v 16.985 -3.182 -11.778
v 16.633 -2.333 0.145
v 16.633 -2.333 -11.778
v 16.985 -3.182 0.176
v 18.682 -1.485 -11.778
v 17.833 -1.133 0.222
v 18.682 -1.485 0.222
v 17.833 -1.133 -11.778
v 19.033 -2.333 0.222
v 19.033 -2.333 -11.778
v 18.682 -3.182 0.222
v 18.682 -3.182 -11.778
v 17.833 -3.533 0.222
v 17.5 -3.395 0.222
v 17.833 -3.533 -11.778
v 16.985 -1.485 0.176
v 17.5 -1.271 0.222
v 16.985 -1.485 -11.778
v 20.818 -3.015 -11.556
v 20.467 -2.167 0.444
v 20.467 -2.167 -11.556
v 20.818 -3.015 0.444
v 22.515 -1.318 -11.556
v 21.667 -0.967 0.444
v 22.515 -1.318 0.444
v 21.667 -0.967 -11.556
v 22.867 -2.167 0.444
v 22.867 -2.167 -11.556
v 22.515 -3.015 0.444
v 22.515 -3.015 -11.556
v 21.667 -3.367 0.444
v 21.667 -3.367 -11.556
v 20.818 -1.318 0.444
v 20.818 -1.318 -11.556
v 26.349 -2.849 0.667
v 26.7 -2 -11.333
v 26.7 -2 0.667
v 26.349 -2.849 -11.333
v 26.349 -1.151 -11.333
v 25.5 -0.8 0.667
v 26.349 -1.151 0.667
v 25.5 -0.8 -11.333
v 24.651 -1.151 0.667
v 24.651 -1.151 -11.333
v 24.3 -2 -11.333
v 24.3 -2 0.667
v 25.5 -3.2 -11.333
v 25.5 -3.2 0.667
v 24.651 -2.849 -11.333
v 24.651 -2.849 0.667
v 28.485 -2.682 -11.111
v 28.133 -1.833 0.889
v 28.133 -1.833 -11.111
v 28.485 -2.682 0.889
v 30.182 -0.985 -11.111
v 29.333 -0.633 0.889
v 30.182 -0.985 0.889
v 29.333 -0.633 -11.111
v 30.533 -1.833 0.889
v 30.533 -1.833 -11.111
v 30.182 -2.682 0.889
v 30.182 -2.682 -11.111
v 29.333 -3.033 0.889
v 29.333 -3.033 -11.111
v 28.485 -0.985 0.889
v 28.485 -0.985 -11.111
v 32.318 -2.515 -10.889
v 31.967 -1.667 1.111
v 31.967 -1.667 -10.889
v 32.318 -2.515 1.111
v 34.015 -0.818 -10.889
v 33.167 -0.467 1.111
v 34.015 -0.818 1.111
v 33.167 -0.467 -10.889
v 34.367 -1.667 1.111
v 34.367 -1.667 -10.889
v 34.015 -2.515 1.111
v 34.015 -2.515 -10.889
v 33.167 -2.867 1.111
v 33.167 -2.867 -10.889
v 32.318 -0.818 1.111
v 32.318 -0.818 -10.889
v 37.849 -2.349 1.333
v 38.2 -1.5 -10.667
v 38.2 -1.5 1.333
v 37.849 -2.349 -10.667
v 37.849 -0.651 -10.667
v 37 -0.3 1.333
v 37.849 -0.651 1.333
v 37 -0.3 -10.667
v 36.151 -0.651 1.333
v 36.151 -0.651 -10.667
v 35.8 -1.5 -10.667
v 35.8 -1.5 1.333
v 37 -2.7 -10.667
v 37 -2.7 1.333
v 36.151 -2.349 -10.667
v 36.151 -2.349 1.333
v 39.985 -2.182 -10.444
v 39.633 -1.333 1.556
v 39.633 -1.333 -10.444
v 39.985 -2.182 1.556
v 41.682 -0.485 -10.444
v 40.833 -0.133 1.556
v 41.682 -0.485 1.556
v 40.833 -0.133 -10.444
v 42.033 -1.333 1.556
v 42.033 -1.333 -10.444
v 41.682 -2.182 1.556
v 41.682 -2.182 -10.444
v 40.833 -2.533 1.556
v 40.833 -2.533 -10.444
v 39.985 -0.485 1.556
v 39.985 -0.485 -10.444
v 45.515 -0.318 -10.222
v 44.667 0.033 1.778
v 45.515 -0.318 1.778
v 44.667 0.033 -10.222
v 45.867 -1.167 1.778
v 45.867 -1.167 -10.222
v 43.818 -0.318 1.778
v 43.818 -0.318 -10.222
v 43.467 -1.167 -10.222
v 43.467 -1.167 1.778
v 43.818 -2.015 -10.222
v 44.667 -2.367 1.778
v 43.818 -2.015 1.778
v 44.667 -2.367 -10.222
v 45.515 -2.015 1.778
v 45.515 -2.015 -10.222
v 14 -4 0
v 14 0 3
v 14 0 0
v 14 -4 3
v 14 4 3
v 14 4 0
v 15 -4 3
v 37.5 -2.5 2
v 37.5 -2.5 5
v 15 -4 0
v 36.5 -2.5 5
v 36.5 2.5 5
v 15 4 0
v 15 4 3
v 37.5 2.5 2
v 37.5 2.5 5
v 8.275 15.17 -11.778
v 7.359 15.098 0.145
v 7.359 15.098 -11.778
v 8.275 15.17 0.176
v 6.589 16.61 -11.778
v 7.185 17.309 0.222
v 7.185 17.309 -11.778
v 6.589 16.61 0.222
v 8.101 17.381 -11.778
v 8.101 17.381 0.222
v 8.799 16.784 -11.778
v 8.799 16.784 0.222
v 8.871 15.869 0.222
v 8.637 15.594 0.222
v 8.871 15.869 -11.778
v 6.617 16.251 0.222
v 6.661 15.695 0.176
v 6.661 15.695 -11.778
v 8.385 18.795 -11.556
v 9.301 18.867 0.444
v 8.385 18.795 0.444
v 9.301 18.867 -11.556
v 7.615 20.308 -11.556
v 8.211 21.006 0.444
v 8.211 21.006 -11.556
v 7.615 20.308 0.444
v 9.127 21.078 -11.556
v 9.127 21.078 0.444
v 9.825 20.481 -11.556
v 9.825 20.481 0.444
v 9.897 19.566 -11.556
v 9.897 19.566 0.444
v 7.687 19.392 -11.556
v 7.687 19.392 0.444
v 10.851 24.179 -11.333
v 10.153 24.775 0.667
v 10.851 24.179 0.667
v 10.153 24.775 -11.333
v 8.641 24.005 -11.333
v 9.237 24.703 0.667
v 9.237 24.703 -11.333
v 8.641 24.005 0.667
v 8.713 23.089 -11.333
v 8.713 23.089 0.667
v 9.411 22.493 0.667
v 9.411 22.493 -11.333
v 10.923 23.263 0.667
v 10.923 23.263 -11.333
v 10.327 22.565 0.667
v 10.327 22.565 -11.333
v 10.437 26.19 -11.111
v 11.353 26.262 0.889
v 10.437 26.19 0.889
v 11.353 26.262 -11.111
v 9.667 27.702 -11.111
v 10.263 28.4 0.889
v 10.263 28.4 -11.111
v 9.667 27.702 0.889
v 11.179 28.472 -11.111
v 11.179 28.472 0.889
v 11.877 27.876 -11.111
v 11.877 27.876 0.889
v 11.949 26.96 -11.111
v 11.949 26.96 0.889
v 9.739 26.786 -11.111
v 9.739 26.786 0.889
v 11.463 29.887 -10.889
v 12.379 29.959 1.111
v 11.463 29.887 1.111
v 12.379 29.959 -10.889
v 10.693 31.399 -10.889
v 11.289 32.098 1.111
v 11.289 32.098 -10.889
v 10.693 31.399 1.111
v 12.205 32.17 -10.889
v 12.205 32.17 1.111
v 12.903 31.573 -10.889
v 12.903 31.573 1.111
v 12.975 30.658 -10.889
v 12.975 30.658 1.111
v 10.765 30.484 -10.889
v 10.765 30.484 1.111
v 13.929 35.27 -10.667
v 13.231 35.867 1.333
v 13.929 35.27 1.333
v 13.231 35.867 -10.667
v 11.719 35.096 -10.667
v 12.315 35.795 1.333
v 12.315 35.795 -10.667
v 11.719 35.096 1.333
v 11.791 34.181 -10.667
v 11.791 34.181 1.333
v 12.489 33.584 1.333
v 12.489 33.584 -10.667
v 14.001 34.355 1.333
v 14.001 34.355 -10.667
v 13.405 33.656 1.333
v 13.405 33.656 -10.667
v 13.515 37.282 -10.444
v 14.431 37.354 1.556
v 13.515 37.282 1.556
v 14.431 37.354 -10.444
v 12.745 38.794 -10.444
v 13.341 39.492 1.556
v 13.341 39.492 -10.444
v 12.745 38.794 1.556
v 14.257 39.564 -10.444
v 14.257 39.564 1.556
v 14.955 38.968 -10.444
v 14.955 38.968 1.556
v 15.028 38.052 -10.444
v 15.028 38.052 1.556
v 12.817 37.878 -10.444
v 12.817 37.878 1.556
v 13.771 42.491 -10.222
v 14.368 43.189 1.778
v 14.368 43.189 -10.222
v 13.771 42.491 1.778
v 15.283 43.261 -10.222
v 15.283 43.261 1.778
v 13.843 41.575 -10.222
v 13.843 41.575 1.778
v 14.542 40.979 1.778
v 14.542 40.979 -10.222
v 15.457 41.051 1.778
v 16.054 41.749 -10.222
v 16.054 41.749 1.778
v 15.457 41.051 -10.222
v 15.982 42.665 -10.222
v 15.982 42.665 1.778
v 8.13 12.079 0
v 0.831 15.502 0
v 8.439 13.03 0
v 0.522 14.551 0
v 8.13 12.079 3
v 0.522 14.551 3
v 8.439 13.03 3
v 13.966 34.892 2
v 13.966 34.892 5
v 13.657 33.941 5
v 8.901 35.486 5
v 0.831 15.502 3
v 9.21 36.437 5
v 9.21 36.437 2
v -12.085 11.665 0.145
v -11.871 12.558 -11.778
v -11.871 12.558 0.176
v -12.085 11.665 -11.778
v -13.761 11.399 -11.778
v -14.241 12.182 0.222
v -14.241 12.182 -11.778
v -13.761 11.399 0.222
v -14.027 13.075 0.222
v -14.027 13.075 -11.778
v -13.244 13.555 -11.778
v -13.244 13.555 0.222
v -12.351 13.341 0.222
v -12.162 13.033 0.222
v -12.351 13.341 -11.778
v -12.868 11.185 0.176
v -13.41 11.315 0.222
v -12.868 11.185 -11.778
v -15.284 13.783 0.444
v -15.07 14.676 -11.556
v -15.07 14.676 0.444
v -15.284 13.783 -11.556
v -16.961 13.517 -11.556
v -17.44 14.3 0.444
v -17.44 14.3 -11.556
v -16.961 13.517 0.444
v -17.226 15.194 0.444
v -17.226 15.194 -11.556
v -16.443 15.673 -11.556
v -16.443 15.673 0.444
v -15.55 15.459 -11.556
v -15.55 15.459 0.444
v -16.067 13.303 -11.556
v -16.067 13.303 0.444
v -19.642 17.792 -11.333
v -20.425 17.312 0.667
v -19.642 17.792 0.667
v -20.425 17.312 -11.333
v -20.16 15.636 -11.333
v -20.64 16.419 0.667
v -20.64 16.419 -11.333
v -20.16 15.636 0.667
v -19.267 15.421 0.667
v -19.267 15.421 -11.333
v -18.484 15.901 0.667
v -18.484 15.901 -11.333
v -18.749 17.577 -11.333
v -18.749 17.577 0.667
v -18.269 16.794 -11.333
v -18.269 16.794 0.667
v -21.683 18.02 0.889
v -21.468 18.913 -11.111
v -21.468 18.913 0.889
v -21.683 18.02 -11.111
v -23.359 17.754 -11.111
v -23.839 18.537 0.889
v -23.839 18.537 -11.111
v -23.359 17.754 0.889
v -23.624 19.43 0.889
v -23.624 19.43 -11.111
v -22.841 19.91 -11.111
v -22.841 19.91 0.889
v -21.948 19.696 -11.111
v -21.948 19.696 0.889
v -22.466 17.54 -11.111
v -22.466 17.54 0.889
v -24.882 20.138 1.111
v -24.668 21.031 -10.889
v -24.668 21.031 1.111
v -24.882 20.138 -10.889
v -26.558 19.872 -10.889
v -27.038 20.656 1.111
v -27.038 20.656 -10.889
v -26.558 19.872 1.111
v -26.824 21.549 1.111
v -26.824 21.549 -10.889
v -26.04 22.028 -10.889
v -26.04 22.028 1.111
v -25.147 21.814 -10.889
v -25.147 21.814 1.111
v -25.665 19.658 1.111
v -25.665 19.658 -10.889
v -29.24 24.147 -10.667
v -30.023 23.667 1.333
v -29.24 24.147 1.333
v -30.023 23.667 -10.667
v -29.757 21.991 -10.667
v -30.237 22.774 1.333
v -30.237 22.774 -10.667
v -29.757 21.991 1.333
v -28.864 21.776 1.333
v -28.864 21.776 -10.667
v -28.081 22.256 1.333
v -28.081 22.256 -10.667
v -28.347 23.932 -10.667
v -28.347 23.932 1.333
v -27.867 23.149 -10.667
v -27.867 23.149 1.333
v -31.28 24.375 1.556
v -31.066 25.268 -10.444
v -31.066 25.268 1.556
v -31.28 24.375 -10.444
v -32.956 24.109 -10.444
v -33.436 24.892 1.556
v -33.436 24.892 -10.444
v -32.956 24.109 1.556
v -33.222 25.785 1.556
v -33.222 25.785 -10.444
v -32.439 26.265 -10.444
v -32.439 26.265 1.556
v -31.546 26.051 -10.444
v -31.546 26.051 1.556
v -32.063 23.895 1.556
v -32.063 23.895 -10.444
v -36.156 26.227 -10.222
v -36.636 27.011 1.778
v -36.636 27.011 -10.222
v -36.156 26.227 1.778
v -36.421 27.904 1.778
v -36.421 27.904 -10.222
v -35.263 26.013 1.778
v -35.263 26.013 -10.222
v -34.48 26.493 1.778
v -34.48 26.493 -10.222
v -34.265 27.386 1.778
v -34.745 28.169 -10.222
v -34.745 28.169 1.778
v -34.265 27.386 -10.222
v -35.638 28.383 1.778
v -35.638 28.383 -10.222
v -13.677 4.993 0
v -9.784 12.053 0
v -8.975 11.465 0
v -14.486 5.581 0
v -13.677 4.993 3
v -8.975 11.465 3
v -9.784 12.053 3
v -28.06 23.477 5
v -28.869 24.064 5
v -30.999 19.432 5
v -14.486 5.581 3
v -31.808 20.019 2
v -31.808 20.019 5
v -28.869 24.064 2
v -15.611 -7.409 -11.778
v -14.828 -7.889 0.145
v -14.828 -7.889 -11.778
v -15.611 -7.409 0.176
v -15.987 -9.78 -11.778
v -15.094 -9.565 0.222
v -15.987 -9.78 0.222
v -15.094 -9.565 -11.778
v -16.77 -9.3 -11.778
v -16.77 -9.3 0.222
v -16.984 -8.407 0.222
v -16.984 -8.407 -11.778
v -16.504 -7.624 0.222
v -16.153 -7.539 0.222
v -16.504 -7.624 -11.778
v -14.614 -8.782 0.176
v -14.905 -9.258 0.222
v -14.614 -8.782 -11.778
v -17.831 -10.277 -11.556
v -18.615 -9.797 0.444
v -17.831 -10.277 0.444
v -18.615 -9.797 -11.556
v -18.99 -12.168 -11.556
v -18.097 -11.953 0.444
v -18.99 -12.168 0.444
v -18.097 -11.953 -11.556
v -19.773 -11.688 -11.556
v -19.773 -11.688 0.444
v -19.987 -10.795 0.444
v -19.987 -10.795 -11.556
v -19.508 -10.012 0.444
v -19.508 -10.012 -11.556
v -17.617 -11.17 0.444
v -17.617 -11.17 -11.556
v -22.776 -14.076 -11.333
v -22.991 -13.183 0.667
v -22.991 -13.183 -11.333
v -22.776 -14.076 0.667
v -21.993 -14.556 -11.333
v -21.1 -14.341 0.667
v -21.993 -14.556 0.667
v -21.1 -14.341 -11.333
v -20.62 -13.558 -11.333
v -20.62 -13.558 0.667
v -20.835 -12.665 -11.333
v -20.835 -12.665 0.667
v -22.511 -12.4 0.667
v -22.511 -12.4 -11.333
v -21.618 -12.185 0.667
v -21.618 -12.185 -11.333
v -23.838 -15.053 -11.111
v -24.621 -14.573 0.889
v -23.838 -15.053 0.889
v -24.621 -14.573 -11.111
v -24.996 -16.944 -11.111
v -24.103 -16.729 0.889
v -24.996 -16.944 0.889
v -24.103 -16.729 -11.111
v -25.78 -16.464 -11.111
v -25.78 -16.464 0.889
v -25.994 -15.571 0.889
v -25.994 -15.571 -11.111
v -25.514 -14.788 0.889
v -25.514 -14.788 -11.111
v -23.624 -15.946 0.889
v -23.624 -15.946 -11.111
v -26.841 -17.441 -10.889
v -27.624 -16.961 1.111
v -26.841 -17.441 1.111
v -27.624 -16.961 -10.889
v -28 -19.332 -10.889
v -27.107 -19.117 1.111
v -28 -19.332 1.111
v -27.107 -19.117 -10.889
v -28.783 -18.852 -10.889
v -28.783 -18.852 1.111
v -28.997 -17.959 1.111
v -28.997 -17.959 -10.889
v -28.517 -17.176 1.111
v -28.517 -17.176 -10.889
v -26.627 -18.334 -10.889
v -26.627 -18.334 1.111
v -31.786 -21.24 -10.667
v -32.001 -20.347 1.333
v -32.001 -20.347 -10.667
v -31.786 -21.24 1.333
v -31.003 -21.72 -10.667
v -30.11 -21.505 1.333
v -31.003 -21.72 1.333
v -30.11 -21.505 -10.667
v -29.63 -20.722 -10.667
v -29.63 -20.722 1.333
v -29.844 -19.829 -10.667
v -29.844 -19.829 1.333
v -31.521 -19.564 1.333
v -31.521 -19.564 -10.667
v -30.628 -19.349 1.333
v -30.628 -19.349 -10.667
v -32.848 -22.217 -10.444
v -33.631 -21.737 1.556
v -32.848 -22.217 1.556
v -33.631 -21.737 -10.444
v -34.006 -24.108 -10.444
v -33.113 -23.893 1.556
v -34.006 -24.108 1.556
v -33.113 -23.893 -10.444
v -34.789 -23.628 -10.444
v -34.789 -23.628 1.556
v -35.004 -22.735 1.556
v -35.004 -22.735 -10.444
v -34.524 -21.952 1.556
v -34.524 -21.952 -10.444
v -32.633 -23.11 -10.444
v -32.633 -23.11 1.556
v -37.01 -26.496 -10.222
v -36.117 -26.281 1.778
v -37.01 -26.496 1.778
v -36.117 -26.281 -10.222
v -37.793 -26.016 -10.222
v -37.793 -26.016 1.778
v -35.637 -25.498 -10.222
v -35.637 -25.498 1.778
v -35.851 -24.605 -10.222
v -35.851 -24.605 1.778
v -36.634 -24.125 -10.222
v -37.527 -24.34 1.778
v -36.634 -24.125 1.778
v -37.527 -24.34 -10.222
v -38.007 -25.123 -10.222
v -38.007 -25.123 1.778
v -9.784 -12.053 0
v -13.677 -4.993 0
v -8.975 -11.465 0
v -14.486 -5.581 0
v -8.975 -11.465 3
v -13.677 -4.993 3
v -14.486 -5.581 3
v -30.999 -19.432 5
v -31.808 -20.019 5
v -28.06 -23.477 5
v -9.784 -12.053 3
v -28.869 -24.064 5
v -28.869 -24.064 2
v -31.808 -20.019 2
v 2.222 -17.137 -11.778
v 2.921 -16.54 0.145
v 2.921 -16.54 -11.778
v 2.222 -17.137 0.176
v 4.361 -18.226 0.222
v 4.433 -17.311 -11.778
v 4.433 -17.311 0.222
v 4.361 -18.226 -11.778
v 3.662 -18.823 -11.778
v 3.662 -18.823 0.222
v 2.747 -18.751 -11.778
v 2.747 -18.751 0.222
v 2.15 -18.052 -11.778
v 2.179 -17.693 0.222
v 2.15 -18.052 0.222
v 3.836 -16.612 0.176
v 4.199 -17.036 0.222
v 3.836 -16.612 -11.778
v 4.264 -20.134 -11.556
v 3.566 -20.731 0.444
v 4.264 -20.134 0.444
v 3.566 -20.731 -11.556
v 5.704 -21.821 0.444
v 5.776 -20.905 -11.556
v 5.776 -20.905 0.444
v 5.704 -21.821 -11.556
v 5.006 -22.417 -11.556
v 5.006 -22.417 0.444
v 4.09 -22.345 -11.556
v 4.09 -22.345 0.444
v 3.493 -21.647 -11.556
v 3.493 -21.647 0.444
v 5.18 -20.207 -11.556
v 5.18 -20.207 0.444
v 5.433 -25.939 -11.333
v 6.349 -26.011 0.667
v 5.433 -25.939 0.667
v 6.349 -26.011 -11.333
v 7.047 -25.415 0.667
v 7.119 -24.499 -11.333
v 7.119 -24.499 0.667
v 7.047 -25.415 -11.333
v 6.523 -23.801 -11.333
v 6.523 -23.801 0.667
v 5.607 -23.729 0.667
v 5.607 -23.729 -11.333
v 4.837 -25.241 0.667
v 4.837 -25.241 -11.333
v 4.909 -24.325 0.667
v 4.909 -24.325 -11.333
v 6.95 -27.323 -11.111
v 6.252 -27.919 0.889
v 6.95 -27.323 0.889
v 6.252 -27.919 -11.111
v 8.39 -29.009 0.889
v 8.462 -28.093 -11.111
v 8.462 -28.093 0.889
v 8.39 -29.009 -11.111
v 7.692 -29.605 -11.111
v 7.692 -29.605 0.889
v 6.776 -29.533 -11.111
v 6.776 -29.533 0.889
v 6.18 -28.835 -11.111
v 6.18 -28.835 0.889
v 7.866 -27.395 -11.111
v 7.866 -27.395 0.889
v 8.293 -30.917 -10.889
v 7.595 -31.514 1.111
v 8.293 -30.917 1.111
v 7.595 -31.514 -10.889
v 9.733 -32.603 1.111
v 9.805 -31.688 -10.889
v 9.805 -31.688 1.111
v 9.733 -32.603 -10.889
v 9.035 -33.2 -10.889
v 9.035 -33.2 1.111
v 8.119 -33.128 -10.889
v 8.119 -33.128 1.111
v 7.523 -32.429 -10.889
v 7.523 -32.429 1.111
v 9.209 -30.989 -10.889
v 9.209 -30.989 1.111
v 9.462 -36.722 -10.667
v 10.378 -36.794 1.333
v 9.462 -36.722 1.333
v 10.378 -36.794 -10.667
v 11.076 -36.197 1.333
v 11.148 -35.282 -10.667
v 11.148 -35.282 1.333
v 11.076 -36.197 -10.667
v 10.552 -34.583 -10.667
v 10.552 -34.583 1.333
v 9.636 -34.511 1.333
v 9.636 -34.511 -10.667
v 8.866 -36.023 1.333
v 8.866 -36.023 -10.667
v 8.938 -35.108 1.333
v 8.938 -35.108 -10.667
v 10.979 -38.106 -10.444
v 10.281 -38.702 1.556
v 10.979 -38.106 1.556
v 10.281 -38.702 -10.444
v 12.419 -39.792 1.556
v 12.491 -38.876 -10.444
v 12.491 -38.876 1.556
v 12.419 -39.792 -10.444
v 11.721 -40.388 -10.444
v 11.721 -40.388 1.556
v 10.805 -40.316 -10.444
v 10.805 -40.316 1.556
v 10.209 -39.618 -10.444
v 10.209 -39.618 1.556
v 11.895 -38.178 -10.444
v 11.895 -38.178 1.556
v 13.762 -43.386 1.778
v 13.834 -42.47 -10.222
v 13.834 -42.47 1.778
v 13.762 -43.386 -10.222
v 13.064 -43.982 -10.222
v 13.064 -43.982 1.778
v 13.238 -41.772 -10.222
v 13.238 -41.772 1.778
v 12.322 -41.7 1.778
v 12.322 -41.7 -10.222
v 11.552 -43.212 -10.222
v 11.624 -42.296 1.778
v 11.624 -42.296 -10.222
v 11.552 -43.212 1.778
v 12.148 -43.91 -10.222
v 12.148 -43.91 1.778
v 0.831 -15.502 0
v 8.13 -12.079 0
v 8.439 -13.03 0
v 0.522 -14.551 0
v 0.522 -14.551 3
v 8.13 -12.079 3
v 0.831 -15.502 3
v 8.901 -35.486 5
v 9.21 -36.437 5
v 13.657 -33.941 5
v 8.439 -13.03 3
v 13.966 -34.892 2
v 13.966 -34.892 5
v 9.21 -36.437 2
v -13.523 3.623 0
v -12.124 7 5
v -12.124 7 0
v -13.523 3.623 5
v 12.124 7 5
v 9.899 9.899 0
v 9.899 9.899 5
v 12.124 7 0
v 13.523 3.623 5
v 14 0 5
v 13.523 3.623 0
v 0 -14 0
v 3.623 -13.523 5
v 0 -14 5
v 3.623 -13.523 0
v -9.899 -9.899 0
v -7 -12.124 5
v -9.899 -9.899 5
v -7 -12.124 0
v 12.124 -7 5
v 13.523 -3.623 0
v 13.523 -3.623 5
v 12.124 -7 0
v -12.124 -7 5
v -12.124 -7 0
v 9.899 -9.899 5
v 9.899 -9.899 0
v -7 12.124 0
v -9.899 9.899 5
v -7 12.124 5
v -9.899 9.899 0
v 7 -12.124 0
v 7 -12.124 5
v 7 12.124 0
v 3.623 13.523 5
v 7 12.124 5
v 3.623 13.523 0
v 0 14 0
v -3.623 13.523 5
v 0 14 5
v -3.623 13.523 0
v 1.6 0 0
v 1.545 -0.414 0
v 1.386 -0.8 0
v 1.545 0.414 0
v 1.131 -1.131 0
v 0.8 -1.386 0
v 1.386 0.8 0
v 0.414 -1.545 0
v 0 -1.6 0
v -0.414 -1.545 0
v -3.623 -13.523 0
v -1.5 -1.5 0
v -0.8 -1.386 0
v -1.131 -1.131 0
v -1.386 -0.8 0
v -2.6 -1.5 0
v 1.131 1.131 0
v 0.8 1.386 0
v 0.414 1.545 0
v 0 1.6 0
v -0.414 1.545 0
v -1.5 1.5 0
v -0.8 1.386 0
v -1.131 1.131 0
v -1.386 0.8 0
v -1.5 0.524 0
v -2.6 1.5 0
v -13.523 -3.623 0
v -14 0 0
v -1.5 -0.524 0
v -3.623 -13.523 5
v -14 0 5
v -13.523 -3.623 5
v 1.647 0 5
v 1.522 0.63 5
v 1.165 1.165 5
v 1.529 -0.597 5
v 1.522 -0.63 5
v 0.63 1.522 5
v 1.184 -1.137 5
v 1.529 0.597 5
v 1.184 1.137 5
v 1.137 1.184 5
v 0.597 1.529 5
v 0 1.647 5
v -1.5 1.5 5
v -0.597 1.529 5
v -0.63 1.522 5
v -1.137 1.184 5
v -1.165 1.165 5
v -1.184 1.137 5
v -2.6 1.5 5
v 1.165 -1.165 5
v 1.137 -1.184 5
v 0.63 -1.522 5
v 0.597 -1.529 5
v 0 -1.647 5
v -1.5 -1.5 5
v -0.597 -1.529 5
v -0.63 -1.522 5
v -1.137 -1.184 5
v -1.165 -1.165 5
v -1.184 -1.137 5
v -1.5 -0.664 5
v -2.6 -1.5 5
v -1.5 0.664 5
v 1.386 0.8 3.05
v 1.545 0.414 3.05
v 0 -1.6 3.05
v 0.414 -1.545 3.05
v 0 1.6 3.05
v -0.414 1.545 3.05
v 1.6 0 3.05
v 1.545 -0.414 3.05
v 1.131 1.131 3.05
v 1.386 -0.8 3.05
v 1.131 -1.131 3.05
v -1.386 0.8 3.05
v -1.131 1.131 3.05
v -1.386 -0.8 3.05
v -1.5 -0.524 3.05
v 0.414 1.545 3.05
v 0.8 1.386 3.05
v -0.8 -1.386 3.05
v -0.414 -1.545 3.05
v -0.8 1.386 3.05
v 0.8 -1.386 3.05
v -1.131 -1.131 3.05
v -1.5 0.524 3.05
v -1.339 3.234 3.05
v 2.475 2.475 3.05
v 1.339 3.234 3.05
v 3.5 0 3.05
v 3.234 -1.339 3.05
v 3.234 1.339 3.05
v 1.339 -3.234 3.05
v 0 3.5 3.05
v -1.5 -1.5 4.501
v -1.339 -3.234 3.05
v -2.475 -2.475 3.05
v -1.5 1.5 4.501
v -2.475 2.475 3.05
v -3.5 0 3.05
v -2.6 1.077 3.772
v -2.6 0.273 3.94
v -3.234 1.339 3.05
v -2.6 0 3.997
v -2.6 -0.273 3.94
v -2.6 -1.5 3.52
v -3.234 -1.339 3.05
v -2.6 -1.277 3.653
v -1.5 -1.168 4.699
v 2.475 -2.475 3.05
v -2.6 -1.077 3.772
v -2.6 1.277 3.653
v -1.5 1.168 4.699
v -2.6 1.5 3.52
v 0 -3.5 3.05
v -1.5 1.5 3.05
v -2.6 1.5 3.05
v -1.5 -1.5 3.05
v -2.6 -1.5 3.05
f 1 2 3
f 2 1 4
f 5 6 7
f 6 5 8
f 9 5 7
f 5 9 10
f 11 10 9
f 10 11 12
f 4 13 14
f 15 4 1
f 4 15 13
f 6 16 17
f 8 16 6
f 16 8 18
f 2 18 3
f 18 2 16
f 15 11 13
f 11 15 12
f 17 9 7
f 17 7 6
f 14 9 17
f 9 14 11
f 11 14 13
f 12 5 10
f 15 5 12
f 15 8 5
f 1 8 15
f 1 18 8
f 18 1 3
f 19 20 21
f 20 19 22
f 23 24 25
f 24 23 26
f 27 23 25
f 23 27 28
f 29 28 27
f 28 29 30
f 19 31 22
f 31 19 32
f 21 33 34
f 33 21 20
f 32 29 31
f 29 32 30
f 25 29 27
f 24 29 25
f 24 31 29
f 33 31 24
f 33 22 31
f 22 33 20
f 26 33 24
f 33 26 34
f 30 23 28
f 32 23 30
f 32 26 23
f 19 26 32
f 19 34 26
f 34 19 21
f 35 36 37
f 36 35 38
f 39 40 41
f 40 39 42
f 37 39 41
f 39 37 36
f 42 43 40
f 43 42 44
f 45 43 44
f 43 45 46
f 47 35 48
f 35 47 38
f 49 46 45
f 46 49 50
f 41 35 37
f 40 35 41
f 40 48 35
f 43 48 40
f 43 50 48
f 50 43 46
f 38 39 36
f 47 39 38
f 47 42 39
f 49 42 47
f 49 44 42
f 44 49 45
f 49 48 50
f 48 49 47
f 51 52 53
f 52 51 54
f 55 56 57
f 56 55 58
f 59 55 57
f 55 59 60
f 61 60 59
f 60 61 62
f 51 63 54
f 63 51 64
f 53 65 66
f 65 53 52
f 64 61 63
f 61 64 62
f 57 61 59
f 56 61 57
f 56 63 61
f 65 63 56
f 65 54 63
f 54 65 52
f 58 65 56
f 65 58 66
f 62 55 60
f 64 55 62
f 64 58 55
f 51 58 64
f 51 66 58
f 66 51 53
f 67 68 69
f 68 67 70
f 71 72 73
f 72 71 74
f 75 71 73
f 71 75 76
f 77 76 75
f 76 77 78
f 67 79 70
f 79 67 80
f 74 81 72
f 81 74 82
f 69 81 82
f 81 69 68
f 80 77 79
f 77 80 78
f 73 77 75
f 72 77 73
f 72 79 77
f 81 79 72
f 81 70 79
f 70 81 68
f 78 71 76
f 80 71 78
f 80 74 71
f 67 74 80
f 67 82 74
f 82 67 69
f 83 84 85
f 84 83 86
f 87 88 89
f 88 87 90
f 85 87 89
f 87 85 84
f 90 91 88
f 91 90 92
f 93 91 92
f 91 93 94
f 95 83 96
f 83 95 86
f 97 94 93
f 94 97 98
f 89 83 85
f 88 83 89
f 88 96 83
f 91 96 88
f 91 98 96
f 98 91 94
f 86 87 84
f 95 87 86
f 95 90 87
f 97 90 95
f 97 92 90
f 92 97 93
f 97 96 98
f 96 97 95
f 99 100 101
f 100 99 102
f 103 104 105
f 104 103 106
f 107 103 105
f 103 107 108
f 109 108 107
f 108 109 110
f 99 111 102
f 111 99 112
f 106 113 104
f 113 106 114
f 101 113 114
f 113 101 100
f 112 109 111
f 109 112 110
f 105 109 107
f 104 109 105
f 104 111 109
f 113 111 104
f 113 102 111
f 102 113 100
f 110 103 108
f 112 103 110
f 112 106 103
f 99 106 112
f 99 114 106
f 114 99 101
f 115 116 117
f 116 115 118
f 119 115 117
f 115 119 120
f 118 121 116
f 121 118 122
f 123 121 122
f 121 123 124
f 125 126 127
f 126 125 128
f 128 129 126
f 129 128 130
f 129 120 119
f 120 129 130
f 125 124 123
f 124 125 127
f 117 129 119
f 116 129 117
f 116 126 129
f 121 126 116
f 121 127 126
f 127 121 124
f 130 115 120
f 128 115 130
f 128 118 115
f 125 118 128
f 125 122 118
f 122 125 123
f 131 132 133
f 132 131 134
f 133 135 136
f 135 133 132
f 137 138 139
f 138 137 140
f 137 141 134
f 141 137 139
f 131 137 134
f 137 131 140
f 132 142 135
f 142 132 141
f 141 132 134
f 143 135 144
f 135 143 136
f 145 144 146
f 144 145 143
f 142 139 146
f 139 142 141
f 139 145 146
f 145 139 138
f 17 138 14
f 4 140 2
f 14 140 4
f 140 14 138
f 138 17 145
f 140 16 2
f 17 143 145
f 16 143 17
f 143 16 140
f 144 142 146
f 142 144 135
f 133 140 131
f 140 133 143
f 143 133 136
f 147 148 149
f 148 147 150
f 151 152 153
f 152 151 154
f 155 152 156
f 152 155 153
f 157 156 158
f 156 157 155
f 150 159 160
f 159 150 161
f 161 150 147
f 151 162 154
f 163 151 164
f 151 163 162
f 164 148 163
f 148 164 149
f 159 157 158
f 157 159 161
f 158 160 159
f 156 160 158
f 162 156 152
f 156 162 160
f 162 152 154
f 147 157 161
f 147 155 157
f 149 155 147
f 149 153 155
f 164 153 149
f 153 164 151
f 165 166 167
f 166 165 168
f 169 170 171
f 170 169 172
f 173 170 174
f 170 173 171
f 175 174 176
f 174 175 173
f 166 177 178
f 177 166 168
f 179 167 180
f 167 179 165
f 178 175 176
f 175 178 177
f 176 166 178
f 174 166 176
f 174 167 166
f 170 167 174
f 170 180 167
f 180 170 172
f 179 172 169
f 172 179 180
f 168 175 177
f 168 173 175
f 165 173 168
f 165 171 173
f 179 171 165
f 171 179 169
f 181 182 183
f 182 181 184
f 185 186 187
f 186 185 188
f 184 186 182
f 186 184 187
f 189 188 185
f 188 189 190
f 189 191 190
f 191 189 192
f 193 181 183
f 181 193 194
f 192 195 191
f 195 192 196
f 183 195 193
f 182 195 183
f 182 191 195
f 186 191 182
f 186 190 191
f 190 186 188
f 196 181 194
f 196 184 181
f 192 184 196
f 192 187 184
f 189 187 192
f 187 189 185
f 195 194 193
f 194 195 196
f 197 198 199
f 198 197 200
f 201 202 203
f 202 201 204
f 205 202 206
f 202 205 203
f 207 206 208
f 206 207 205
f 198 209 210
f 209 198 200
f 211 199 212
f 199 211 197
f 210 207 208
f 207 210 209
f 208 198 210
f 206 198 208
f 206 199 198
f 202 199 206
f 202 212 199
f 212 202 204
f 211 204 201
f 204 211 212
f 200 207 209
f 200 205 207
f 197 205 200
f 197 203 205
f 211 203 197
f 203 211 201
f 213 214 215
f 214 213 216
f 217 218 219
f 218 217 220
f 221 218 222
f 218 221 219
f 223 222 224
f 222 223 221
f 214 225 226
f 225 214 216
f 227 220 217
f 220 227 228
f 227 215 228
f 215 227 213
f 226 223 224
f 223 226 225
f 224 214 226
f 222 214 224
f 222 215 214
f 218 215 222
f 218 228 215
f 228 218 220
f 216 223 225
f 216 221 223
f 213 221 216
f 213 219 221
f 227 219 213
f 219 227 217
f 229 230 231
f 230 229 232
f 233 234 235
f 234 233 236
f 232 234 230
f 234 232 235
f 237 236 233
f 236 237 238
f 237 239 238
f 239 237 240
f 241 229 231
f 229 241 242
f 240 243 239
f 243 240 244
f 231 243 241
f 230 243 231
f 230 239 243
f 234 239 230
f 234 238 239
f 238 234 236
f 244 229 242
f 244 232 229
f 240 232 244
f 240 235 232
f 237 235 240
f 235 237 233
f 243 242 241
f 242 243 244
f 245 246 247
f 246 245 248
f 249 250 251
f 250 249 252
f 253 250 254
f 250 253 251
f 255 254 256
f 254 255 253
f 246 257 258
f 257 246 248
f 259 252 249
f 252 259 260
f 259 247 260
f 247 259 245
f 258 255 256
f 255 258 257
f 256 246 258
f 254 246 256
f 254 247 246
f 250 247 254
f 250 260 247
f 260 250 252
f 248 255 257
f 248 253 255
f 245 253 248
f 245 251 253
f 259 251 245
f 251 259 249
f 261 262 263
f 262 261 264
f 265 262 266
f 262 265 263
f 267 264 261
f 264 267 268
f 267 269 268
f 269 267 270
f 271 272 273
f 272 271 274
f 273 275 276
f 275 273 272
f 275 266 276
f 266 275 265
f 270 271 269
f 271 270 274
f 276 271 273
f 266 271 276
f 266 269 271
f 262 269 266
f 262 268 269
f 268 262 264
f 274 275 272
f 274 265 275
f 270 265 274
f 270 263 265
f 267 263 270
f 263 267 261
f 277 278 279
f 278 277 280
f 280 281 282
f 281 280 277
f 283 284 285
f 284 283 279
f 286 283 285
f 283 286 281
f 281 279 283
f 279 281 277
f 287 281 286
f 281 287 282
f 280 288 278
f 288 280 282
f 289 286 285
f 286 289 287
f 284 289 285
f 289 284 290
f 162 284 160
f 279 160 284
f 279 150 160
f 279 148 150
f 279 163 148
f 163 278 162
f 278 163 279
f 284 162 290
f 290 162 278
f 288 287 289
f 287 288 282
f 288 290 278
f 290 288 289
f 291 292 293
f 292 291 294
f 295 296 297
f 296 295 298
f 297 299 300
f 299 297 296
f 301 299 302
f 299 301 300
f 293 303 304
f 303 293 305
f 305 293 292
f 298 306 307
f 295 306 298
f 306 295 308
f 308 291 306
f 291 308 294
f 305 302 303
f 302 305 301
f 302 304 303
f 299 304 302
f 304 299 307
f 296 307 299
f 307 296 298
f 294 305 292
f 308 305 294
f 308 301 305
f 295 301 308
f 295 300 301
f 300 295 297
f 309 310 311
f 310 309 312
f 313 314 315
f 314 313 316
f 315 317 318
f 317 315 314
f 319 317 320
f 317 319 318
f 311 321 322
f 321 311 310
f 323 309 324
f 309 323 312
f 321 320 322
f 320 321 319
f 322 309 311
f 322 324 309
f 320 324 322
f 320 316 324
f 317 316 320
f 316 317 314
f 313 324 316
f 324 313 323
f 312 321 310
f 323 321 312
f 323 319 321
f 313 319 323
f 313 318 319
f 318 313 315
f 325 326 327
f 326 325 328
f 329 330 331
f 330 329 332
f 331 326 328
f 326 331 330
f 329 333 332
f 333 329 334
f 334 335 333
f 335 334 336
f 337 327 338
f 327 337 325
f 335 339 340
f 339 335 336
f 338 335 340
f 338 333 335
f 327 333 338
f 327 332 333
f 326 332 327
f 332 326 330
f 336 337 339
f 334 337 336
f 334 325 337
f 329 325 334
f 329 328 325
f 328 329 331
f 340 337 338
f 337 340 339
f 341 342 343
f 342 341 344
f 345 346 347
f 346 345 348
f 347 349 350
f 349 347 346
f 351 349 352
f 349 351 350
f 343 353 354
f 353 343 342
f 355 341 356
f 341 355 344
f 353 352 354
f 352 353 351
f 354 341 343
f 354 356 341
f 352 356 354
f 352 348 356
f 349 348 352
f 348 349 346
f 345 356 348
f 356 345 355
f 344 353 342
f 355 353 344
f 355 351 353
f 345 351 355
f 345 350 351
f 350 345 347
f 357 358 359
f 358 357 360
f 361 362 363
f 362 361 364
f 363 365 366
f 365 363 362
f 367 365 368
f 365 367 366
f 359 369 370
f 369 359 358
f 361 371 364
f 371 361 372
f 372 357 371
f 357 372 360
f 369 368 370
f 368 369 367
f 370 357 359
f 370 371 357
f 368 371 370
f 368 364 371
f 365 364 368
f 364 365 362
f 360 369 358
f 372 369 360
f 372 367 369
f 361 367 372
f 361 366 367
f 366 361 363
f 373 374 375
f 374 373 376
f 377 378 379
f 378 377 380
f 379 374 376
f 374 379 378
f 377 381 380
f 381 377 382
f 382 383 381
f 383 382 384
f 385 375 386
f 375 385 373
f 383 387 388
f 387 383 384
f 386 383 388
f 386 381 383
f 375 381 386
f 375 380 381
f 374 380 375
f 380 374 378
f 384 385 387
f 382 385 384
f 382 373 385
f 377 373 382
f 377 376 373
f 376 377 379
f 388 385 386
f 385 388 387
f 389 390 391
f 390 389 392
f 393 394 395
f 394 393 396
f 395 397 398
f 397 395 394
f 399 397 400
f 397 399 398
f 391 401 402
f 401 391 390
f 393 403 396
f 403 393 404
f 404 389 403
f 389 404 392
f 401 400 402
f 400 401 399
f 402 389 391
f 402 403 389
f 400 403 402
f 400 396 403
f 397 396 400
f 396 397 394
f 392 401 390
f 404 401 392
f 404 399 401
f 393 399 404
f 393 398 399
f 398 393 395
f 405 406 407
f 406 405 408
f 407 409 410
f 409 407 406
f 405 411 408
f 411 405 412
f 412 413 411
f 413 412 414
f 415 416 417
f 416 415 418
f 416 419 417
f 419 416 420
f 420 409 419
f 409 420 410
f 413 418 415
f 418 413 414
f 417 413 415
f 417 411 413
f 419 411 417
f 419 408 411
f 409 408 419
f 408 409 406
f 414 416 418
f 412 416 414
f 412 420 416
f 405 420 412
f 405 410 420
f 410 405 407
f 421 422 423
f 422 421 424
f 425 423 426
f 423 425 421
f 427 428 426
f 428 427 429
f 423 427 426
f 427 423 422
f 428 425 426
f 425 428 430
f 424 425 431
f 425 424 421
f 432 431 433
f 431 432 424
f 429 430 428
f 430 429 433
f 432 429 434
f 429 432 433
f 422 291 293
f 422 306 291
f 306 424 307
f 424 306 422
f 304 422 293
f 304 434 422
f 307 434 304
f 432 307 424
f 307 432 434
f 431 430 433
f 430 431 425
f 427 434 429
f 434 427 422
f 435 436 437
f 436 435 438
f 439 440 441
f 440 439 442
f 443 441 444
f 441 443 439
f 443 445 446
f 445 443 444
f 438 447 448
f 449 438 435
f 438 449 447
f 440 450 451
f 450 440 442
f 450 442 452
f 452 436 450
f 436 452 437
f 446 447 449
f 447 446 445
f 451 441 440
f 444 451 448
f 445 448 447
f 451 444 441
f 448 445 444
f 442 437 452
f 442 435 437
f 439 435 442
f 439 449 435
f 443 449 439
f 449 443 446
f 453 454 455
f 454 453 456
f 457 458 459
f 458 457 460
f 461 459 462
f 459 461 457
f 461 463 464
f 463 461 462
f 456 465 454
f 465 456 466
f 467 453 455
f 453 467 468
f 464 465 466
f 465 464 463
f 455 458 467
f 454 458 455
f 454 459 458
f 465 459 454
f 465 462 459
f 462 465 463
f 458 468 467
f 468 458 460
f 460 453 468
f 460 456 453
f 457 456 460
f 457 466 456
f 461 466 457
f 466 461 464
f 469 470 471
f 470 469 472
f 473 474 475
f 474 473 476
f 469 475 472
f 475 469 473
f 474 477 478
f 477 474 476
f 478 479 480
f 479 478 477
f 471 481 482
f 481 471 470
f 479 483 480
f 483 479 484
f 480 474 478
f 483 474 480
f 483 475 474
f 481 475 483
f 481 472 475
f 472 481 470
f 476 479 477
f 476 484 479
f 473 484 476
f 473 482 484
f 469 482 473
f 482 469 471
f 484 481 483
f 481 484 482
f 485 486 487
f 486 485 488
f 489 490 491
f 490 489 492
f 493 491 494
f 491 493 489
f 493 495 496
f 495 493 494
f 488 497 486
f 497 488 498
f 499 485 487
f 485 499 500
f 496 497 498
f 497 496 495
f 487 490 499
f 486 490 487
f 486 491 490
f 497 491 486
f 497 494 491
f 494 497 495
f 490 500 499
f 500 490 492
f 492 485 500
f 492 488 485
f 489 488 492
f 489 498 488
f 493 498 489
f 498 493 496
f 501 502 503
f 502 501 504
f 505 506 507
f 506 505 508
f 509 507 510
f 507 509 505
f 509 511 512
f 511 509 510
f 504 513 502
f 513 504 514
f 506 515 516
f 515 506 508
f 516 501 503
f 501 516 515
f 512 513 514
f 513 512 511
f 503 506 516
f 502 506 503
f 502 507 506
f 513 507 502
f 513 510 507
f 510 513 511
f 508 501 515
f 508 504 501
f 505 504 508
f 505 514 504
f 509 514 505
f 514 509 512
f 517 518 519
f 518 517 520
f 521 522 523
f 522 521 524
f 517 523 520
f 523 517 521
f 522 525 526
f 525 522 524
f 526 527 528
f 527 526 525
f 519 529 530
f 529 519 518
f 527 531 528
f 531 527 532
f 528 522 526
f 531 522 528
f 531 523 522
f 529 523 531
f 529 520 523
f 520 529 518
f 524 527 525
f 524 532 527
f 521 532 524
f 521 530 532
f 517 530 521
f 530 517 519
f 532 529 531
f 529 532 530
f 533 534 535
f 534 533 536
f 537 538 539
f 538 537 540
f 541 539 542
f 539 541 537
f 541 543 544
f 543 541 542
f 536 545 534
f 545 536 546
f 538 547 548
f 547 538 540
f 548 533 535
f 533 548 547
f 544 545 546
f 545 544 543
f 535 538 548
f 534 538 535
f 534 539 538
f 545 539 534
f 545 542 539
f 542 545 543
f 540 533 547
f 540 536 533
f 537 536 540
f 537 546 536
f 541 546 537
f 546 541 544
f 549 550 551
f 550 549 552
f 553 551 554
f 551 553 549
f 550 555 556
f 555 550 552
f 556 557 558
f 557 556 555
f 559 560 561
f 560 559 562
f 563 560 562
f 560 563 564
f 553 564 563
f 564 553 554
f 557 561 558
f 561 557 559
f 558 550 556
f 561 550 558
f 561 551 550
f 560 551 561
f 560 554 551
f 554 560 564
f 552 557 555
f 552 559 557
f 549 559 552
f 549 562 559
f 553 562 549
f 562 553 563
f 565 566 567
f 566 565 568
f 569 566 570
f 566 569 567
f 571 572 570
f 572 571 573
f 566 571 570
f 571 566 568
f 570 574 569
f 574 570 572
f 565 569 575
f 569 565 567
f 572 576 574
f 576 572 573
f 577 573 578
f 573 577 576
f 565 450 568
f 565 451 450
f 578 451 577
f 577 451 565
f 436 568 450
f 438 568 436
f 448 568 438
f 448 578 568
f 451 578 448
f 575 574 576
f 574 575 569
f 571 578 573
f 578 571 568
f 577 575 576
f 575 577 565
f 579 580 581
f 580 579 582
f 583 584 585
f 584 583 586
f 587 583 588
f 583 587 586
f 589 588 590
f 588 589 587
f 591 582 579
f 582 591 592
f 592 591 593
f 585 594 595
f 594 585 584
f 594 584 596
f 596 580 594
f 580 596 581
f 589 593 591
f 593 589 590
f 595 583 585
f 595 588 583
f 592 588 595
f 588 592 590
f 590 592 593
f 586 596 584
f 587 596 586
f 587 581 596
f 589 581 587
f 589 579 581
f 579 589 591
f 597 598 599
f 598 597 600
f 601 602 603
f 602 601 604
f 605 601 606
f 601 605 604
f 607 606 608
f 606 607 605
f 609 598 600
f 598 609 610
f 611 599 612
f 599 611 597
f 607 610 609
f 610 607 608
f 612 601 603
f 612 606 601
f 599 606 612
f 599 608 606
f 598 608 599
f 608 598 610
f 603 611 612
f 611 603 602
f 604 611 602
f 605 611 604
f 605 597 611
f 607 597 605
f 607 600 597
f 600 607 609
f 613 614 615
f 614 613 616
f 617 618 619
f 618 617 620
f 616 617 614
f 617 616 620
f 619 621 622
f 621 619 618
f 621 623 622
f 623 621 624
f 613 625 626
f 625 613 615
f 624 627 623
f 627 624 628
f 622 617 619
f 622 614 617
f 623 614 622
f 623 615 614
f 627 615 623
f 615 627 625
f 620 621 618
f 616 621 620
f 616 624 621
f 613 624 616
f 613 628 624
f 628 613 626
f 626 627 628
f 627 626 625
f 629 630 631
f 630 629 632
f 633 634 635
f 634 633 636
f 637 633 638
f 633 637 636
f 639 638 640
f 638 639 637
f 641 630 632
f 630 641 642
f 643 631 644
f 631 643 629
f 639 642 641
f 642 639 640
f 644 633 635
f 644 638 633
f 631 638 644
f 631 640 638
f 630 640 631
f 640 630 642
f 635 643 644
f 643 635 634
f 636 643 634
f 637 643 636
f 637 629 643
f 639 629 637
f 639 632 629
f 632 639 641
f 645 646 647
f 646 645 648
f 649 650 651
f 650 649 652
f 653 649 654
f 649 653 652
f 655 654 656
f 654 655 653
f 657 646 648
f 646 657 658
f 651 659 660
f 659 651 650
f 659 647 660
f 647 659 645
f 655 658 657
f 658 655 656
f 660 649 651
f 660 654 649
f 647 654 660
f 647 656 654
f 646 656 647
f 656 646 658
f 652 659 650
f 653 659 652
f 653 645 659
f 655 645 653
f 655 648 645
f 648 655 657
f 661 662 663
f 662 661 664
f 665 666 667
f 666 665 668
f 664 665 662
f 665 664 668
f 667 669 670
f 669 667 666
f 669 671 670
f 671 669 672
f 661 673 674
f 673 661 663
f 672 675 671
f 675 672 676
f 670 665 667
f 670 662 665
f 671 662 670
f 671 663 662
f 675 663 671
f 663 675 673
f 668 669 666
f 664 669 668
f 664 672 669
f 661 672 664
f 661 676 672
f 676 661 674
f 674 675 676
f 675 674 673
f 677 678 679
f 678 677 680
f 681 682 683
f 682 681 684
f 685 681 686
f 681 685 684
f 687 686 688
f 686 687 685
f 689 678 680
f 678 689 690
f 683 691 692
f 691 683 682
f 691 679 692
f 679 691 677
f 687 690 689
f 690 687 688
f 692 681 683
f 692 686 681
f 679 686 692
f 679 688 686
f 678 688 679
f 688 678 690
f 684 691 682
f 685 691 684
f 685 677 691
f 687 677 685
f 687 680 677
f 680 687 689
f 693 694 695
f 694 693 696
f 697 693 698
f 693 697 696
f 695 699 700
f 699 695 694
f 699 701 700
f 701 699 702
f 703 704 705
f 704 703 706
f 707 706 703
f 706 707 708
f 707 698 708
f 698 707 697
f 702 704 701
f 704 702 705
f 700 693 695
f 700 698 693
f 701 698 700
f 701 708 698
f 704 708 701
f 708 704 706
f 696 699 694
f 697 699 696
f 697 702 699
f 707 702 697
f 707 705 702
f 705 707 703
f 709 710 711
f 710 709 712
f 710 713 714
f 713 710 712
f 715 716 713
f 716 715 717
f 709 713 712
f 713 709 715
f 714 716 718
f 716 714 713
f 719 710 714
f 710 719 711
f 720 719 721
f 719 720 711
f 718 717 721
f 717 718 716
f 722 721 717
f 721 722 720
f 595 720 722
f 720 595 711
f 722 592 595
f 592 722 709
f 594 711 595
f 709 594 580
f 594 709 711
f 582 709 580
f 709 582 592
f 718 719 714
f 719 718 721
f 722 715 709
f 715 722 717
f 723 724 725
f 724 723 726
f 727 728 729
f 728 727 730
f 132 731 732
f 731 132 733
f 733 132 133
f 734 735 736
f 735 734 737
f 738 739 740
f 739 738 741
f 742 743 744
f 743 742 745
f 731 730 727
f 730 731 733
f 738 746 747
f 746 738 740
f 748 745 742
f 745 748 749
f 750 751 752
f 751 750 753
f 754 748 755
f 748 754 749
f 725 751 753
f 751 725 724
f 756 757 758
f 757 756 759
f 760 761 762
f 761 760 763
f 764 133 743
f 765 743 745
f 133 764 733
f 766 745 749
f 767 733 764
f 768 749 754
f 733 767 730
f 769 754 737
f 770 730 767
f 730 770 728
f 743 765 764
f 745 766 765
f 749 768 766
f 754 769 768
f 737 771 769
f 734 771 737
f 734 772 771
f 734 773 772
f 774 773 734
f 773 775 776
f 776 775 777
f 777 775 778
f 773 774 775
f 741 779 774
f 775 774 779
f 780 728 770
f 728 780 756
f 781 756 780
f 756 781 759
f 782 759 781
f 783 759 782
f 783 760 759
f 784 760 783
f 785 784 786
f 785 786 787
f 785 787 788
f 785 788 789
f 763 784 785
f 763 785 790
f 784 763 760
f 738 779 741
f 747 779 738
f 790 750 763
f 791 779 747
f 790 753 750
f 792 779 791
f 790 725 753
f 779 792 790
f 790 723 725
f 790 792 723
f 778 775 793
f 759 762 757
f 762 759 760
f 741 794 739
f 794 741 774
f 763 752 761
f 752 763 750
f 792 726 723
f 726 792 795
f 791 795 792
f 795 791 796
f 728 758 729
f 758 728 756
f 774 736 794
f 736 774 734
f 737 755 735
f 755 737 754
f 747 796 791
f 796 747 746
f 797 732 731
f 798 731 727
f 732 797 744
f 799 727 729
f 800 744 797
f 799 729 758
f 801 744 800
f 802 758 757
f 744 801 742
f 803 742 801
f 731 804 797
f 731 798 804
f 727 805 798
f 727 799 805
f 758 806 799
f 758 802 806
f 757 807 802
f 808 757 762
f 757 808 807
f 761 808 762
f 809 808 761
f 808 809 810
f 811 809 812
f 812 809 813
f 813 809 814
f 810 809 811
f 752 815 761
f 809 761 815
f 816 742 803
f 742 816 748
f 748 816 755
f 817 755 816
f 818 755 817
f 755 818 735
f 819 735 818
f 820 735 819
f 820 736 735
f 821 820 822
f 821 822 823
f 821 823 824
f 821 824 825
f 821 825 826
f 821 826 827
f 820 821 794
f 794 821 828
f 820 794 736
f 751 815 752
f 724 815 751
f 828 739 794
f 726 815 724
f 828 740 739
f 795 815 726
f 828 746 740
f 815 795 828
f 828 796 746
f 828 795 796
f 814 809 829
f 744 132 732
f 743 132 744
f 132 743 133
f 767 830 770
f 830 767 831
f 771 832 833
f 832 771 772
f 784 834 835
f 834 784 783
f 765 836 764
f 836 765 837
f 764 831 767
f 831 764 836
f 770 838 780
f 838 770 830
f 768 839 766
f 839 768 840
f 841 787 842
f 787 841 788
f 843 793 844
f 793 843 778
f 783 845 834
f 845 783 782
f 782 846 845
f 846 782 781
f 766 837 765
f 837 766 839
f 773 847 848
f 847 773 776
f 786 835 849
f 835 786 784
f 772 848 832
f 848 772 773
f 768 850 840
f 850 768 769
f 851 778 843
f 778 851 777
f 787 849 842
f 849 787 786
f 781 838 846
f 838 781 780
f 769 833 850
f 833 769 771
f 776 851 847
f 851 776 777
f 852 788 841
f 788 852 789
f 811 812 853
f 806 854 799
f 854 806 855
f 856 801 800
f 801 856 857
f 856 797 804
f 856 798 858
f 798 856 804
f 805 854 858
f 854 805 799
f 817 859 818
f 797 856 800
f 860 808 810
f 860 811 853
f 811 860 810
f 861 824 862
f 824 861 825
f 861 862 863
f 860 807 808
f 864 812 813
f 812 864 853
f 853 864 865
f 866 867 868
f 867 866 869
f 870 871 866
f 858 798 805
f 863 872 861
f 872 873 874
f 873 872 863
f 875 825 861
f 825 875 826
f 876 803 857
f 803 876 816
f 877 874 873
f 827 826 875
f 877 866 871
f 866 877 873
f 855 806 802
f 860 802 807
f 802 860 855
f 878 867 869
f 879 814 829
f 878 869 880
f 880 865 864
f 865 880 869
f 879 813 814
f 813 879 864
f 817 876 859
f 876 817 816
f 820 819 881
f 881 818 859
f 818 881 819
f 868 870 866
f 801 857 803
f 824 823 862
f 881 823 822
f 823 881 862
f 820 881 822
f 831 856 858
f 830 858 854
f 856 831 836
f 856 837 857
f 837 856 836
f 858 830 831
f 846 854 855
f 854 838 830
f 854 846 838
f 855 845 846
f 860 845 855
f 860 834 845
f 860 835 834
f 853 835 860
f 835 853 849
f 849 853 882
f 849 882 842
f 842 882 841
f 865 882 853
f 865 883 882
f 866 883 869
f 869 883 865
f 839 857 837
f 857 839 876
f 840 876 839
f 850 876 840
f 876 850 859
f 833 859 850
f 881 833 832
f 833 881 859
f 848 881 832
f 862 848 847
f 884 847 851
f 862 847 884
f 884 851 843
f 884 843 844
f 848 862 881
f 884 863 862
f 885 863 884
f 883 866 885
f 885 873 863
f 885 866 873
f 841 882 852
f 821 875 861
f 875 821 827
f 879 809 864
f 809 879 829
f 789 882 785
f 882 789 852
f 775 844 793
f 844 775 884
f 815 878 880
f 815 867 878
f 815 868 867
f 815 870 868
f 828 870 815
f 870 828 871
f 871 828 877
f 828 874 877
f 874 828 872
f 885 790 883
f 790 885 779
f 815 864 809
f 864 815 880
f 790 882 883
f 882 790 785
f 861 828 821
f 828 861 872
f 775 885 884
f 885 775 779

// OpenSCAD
// Side Brush — 5-Arm (Roborock S5 / S50 / S51 / S55 / S6 / compatible)
// BOM: $2-8, single Phillips #2 captive screw attachment
//
// AliExpress wiki: "105mm length" → diameter ~105mm (estimate)
// All dimensions (estimate) unless marked datasheet.
//
// Licensed CC0 — use freely.

// ===== PARAMETERS =====

// ---- Overall ----
brush_diameter = 105;   // mm (estimate: per AliExpress wiki "105mm length")
brush_radius   = brush_diameter / 2;

// ---- Hub ----
hub_diameter   =  28;   // mm (estimate: center mounting hub)
hub_height     =   5;   // mm (estimate: hub thickness)

// ---- Arms (5 radial arms) ----
arm_count      =   5;   // (datasheet: 5-arm brush)
arm_width_root =   8;   // mm (estimate: arm width at hub)
arm_width_tip  =   5;   // mm (estimate: arm width at tip)
arm_thickness  =   3;   // mm (estimate: arm material thickness)
arm_rise       =   2;   // mm (estimate: arm curvature / sweep upward from plane)

// ---- Bristle tufts ----
bristle_per_arm =   8;  // (estimate: tufts per arm)
bristle_dia    =   0.8; // mm (estimate: individual bristle)
bristle_len    =  12;   // mm (estimate: bristle extension beyond arm)
bristle_setback =   2;  // mm (estimate: inset from arm tip)

// ---- Hub mounting screw ----
screw_dia      =   3.2; // mm (estimate: M3 clearance — Phillips #2 captive)
screw_head_dia =   7;   // mm (estimate: countersunk head)
screw_head_h   =   2;   // mm (estimate: head depth)

// ---- Hub alignment key / D-flat ----
key_width      =   3;   // mm (estimate: alignment flat on shaft)
key_depth      =   1;   // mm (estimate: flat depth)

// ---- Material ----
// Typical: silicone rubber (flexible) for Roborock S5 side brush

$fn = 24;

// ===== MODULES =====

module arm(angle) {
    rotate([0, 0, angle]) {
        // Arm body — tapered from root to tip
        hull() {
            // Root at hub
            translate([hub_diameter/2, -arm_width_root/2, 0])
                cube([1, arm_width_root, arm_thickness]);
            // Tip
            translate([brush_radius - bristle_setback - bristle_len - 2, -arm_width_tip/2, arm_rise])
                cube([1, arm_width_tip, arm_thickness]);
        }
        
        // Bristle tufts along the arm
        arm_len = brush_radius - hub_diameter/2 - bristle_setback - 2;
        for (i = [1 : bristle_per_arm]) {
            t = i / (bristle_per_arm + 1);
            x = hub_diameter/2 + t * arm_len;
            w = arm_width_root + (arm_width_tip - arm_width_root) * t;
            z_off = arm_rise * t;
            
            // Tuft cluster at this position
            translate([x, -(w/2 - 1.5), -bristle_len + z_off])
                cylinder(h=bristle_len, d=bristle_dia * 3, $fn=8);
        }
    }
}

module hub() {
    difference() {
        // Hub disc
        cylinder(h=hub_height, d=hub_diameter);
        
        // Center screw hole
        translate([0, 0, -0.1])
            cylinder(h=hub_height + 0.2, d=screw_dia);
        
        // Countersink for screw head
        translate([0, 0, hub_height - screw_head_h + 0.05])
            cylinder(h=screw_head_h, d1=screw_head_dia, d2=screw_dia, $fn=16);
        
        // D-flat alignment key
        translate([-screw_dia/2 - key_depth, -key_width/2, -0.1])
            cube([key_depth + 0.1, key_width, hub_height + 0.2]);
    }
}

module side_brush() {
    union() {
        // Arms
        for (i = [0 : arm_count - 1]) {
            arm(i * 360 / arm_count);
        }
        
        // Hub
        hub();
    }
}

// ===== RENDER =====
side_brush();

// ===== NOTES =====
// (1) This is a simplified envelope model — real side brushes are molded
//     silicone with complex sweeping curvature. The model captures the
//     clearance volume needed for chassis and bumper design.
//
// (2) The 5-arm pattern rotates clockwise during operation (viewed from
//     below). The brush spins at ~300-500 RPM.
//
// (3) Mount: single Phillips #2 captive screw, center of hub. The screw
//     is retained in the brush and self-taps into the gearmotor output
//     shaft.
//
// (4) BOM also lists 3-arm ($3-9, fits S8 family) and 2-arm curved ($3-7,
//     fits Saros). This file covers the 5-arm variant for the S5-based
//     OOMWOO-ONE platform.
